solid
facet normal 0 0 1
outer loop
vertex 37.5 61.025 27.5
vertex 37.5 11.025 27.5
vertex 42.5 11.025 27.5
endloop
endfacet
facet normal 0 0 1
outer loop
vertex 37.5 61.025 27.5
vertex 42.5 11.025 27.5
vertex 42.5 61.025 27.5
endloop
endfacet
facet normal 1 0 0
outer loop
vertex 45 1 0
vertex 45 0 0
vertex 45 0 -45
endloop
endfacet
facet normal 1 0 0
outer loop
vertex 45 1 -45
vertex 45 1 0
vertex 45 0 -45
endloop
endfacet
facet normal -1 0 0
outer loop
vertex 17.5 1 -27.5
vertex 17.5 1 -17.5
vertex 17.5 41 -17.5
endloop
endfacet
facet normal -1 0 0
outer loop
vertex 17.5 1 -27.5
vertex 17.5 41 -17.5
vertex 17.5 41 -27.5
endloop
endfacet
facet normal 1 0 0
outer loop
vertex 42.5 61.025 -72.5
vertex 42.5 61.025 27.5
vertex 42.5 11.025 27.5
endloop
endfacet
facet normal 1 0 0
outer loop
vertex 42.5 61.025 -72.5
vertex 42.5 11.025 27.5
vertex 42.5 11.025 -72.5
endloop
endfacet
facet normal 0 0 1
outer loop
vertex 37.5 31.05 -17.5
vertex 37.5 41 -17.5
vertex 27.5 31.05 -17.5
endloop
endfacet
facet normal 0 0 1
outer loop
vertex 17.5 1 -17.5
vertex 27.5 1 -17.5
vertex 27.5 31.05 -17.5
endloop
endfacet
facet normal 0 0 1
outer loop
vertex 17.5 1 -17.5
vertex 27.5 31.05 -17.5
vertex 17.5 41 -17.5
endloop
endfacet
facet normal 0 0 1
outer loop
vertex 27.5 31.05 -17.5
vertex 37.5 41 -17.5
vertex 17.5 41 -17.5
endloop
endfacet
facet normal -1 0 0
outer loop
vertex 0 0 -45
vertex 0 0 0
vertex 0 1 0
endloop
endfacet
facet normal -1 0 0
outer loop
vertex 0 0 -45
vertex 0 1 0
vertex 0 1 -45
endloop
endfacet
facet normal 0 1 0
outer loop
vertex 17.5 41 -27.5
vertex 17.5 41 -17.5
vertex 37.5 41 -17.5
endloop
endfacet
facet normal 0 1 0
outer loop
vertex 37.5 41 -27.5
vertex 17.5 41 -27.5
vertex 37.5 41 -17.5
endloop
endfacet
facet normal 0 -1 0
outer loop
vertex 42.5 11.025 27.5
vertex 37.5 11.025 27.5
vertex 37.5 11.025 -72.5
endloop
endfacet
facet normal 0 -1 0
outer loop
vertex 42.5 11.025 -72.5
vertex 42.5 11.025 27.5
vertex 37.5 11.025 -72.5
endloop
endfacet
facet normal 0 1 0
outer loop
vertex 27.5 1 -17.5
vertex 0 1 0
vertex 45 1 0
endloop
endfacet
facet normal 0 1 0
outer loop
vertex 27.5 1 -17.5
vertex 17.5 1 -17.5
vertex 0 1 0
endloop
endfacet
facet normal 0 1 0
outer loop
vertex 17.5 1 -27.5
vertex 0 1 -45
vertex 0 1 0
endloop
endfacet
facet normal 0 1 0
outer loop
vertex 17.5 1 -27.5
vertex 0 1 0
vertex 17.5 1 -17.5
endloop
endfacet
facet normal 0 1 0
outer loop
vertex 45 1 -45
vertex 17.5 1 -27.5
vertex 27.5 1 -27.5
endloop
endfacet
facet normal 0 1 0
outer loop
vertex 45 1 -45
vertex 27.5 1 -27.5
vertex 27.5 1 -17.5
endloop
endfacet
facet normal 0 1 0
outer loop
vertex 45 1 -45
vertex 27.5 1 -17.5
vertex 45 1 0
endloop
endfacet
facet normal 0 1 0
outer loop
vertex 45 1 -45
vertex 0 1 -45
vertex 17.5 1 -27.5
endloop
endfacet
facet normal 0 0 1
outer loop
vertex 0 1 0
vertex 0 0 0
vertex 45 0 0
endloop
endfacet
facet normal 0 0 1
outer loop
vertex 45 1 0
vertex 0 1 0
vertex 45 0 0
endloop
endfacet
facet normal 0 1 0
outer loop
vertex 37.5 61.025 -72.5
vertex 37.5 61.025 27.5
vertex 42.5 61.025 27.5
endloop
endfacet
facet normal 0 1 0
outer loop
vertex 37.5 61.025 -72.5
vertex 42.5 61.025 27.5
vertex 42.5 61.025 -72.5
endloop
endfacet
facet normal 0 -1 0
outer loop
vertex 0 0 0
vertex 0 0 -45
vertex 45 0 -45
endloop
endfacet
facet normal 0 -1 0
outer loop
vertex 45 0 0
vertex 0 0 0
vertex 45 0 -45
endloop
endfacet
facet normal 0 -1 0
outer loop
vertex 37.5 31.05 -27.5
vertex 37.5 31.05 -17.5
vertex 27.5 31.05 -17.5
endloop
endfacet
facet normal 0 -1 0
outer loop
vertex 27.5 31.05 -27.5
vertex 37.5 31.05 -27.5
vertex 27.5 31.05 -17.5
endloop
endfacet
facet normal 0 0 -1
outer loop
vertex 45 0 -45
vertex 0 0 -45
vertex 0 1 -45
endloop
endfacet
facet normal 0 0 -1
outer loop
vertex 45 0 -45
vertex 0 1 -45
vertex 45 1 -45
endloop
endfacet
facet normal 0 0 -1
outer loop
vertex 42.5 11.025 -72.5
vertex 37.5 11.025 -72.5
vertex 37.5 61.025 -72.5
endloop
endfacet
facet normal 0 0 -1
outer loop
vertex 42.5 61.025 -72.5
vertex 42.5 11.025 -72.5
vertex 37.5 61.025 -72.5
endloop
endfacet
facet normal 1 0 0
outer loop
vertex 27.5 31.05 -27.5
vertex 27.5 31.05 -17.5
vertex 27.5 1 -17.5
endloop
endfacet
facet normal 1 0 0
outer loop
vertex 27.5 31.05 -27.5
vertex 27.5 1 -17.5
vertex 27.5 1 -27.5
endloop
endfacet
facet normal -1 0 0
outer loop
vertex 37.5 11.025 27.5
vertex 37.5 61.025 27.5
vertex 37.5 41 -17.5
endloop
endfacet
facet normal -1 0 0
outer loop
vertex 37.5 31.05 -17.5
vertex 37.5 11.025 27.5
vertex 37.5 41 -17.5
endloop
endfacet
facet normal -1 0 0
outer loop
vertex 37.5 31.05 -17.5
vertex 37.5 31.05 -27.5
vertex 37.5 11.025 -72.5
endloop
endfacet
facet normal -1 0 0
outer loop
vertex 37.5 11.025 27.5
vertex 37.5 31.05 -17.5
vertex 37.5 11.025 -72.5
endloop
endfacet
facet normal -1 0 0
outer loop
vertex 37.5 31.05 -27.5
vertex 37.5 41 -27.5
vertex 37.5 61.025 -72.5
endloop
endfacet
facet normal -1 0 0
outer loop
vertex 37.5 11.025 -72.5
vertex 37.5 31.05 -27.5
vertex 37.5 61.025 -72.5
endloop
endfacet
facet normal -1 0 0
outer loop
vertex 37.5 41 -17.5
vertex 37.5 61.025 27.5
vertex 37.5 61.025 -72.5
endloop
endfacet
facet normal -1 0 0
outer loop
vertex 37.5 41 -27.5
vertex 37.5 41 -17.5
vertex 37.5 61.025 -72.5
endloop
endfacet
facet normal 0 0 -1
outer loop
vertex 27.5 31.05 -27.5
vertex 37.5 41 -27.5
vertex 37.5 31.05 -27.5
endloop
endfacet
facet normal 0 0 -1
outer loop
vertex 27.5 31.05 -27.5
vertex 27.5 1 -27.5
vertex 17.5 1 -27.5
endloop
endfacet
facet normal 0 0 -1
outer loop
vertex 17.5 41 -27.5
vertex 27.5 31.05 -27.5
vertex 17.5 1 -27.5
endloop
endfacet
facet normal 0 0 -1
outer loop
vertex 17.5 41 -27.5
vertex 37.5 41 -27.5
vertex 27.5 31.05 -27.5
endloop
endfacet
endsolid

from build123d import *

# Parameters (mm, degrees)
SKETCH2_W           = 45
SKETCH2_H           = 45
BOSS_EXTRUDE1_DEPTH = 1
SKETCH4_W           = 10
SKETCH4_H           = 10
BOSS_EXTRUDE3_DEPTH = 40
CUT_EXTRUDE4_DEPTH  = 30
BOSS_EXTRUDE8_DEPTH = 10
SKETCH18_W          = 100
SKETCH18_H          = 50
BOSS_EXTRUDE9_DEPTH = 5


with BuildPart() as part:
    # Sketch2 → Boss-Extrude1 (new body)
    with BuildSketch(Plane(origin=(0, 0, 0), x_dir=(1, 0, 0), z_dir=(0, 1, 0))):
        with Locations((22.5, 22.5)):
            Rectangle(SKETCH2_W, SKETCH2_H)
    extrude(amount=BOSS_EXTRUDE1_DEPTH)

    # Sketch4 → Boss-Extrude3 (add)
    with BuildSketch(Plane(origin=(0, 1, 0), x_dir=(1, 0, 0), z_dir=(0, 1, 0))):
        with Locations((22.5, 22.5)):
            Rectangle(SKETCH4_W, SKETCH4_H)
    extrude(amount=BOSS_EXTRUDE3_DEPTH)

    # Sketch10 → Cut-Extrude4 (cut)
    with BuildSketch(Plane(origin=(17.5, 41, -17.5), x_dir=(1, 0, 0), z_dir=(0, 0, 1))):
        Polygon((0, 0), (10, -9.949648776), (17.910752022, -1.998863577), (8.35816631, 7.505623697), align=None)
    extrude(amount=-CUT_EXTRUDE4_DEPTH, mode=Mode.SUBTRACT)

    # Sketch16 → Boss-Extrude8 (add)
    with BuildSketch(Plane(origin=(17.5, 41, -17.5), x_dir=(1, 0, 0), z_dir=(0, 0, 1))):
        Polygon((10, -9.949648776), (0, 0), (20, 0), (20, -9.949648776), align=None)
    extrude(amount=-BOSS_EXTRUDE8_DEPTH)

    # Sketch18 → Boss-Extrude9 (add)
    with BuildSketch(Plane(origin=(37.5, 0, 0), x_dir=(0, 0, -1), z_dir=(1, 0, 0))):
        with Locations((22.5, 36.025175612)):
            Rectangle(SKETCH18_W, SKETCH18_H)
    extrude(amount=BOSS_EXTRUDE9_DEPTH)


solid = part.part
